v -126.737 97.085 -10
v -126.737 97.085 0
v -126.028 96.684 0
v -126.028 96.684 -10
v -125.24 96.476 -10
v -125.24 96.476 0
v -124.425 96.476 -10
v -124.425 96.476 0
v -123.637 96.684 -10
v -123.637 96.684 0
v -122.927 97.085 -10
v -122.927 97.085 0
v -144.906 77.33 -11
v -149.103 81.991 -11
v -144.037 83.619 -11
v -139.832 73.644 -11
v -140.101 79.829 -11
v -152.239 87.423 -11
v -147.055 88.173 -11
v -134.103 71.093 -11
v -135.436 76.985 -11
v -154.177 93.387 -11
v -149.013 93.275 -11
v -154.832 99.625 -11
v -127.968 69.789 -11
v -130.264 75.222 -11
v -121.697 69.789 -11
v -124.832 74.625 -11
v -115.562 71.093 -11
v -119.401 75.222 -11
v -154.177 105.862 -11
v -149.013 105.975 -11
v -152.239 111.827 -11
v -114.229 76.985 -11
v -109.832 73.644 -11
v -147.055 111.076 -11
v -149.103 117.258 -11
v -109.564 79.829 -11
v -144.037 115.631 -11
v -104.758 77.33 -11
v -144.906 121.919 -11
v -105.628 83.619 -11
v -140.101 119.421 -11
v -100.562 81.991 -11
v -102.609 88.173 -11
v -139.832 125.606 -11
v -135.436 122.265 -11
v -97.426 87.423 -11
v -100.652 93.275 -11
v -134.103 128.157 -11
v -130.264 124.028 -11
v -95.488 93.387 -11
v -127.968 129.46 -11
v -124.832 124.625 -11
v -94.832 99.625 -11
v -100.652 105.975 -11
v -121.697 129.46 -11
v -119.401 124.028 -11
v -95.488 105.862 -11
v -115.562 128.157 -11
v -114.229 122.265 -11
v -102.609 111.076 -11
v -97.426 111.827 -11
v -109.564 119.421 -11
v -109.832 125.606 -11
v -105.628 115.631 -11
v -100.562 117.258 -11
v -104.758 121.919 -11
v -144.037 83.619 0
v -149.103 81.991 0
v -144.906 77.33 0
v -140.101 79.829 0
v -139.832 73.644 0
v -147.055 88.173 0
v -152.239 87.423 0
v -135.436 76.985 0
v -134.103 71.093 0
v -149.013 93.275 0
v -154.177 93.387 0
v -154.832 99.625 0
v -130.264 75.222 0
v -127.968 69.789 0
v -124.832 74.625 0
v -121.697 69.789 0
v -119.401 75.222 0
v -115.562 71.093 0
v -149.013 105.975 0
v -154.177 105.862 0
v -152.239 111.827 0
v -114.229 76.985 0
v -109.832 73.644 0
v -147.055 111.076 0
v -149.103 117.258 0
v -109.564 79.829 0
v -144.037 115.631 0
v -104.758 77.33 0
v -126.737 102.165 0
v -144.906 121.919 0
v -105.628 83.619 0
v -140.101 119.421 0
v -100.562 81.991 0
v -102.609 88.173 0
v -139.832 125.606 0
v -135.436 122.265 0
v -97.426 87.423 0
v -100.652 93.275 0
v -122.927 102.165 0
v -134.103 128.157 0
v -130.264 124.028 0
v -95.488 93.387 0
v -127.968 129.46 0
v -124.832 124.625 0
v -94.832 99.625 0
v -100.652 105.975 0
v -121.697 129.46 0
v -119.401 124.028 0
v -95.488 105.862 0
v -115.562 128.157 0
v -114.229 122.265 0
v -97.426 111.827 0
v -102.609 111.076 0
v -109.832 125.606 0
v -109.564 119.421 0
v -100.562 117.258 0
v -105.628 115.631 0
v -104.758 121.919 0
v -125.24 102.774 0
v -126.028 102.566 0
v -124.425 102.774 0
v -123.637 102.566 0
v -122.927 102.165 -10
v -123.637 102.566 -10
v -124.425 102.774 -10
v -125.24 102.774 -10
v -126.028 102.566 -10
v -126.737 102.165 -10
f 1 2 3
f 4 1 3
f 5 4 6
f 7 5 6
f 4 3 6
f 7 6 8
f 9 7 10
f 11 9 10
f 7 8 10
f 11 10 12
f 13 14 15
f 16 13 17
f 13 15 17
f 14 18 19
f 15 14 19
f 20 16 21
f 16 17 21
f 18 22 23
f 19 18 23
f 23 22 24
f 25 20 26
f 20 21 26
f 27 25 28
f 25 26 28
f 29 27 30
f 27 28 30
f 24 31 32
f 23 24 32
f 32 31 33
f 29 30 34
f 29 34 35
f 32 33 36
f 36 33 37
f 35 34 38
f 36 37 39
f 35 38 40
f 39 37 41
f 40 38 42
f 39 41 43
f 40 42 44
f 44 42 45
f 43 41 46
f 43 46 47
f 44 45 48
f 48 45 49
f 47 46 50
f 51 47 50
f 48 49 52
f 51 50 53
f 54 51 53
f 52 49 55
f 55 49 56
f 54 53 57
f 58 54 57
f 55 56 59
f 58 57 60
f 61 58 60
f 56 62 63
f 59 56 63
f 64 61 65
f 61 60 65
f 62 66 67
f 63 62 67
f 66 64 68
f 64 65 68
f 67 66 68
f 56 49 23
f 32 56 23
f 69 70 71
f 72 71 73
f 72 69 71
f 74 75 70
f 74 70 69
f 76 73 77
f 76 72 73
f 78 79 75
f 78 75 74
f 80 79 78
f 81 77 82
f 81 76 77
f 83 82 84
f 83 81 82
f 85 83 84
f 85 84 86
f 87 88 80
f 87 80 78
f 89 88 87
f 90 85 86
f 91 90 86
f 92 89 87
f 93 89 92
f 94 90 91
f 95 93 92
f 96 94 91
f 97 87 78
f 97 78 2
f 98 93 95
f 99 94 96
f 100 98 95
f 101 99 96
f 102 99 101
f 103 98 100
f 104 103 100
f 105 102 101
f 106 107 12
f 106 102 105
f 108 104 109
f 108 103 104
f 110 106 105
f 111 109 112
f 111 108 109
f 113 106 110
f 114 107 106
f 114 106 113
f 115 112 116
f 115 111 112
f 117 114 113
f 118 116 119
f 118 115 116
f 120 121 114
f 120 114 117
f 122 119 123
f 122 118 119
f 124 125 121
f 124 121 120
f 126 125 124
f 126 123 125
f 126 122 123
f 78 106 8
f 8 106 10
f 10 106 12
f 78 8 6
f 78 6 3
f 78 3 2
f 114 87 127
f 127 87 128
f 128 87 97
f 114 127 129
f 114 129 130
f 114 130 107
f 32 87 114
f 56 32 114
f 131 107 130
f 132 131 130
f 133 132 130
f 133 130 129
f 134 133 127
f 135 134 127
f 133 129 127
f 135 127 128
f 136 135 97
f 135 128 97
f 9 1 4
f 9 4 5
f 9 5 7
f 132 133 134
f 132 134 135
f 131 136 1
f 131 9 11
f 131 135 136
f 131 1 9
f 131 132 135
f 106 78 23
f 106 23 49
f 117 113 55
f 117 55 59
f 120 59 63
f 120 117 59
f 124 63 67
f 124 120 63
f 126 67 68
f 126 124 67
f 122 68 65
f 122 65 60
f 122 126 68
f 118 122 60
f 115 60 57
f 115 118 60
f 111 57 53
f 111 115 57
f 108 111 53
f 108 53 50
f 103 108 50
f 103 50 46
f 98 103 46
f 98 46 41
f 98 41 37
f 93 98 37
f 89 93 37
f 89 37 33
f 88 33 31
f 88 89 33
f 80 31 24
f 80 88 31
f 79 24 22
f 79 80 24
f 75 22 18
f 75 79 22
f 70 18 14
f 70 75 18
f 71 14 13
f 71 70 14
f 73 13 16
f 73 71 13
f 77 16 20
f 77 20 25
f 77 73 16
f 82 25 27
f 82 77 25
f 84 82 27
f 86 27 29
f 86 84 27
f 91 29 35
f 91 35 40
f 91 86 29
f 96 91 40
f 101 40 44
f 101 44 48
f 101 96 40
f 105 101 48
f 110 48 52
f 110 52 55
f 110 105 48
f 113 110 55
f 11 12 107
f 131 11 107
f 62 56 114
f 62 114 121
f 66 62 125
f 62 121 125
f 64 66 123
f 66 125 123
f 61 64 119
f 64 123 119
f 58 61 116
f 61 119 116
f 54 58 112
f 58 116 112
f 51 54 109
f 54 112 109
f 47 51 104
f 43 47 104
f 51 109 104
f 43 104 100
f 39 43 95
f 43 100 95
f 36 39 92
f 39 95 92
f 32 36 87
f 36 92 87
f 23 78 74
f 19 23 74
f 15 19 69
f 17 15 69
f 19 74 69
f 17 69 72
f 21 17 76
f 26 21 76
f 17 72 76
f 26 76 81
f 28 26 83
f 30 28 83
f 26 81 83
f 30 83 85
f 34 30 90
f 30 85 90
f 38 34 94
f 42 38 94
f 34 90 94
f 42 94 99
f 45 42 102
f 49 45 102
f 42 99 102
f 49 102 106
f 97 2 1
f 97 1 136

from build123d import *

# Parameters (mm, degrees)
SKETCH2_R           = 30
BOSS_EXTRUDE1_DEPTH = 11
CUT_EXTRUDE1_DEPTH  = 10


with BuildPart() as part:
    # Sketch2 → Boss-Extrude1 (new body)
    with BuildSketch(Plane.XY):
        with Locations((-124.832414552, 99.62481555)):
            Circle(SKETCH2_R)
        with BuildLine():
            Line((-100.652309094, 105.97481555), (-149.012520011, 105.97481555))
            ThreePointArc((-149.012520011, 105.97481555), (-124.832414552, 124.62481555), (-100.652309094, 105.97481555))
        make_face(mode=Mode.SUBTRACT)
        with BuildLine():
            Line((-149.012520011, 93.27481555), (-100.652309094, 93.27481555))
            ThreePointArc((-100.652309094, 93.27481555), (-124.832414552, 74.62481555), (-149.012520011, 93.27481555))
        make_face(mode=Mode.SUBTRACT)
    extrude(amount=-BOSS_EXTRUDE1_DEPTH)

    # Sketch2<3> → Cut-Extrude1 (cut)
    with BuildSketch(Plane.XY):
        with BuildLine():
            ThreePointArc((-122.927414552, 102.16481555), (-124.832414552, 102.79981555), (-126.737414552, 102.16481555))
            Line((-126.737414552, 102.16481555), (-126.737414552, 97.08481555))
            ThreePointArc((-126.737414552, 97.08481555), (-124.832414552, 96.44981555), (-122.927414552, 97.08481555))
            Line((-122.927414552, 97.08481555), (-122.927414552, 102.16481555))
        make_face()
    extrude(amount=-CUT_EXTRUDE1_DEPTH, mode=Mode.SUBTRACT)


solid = part.part
